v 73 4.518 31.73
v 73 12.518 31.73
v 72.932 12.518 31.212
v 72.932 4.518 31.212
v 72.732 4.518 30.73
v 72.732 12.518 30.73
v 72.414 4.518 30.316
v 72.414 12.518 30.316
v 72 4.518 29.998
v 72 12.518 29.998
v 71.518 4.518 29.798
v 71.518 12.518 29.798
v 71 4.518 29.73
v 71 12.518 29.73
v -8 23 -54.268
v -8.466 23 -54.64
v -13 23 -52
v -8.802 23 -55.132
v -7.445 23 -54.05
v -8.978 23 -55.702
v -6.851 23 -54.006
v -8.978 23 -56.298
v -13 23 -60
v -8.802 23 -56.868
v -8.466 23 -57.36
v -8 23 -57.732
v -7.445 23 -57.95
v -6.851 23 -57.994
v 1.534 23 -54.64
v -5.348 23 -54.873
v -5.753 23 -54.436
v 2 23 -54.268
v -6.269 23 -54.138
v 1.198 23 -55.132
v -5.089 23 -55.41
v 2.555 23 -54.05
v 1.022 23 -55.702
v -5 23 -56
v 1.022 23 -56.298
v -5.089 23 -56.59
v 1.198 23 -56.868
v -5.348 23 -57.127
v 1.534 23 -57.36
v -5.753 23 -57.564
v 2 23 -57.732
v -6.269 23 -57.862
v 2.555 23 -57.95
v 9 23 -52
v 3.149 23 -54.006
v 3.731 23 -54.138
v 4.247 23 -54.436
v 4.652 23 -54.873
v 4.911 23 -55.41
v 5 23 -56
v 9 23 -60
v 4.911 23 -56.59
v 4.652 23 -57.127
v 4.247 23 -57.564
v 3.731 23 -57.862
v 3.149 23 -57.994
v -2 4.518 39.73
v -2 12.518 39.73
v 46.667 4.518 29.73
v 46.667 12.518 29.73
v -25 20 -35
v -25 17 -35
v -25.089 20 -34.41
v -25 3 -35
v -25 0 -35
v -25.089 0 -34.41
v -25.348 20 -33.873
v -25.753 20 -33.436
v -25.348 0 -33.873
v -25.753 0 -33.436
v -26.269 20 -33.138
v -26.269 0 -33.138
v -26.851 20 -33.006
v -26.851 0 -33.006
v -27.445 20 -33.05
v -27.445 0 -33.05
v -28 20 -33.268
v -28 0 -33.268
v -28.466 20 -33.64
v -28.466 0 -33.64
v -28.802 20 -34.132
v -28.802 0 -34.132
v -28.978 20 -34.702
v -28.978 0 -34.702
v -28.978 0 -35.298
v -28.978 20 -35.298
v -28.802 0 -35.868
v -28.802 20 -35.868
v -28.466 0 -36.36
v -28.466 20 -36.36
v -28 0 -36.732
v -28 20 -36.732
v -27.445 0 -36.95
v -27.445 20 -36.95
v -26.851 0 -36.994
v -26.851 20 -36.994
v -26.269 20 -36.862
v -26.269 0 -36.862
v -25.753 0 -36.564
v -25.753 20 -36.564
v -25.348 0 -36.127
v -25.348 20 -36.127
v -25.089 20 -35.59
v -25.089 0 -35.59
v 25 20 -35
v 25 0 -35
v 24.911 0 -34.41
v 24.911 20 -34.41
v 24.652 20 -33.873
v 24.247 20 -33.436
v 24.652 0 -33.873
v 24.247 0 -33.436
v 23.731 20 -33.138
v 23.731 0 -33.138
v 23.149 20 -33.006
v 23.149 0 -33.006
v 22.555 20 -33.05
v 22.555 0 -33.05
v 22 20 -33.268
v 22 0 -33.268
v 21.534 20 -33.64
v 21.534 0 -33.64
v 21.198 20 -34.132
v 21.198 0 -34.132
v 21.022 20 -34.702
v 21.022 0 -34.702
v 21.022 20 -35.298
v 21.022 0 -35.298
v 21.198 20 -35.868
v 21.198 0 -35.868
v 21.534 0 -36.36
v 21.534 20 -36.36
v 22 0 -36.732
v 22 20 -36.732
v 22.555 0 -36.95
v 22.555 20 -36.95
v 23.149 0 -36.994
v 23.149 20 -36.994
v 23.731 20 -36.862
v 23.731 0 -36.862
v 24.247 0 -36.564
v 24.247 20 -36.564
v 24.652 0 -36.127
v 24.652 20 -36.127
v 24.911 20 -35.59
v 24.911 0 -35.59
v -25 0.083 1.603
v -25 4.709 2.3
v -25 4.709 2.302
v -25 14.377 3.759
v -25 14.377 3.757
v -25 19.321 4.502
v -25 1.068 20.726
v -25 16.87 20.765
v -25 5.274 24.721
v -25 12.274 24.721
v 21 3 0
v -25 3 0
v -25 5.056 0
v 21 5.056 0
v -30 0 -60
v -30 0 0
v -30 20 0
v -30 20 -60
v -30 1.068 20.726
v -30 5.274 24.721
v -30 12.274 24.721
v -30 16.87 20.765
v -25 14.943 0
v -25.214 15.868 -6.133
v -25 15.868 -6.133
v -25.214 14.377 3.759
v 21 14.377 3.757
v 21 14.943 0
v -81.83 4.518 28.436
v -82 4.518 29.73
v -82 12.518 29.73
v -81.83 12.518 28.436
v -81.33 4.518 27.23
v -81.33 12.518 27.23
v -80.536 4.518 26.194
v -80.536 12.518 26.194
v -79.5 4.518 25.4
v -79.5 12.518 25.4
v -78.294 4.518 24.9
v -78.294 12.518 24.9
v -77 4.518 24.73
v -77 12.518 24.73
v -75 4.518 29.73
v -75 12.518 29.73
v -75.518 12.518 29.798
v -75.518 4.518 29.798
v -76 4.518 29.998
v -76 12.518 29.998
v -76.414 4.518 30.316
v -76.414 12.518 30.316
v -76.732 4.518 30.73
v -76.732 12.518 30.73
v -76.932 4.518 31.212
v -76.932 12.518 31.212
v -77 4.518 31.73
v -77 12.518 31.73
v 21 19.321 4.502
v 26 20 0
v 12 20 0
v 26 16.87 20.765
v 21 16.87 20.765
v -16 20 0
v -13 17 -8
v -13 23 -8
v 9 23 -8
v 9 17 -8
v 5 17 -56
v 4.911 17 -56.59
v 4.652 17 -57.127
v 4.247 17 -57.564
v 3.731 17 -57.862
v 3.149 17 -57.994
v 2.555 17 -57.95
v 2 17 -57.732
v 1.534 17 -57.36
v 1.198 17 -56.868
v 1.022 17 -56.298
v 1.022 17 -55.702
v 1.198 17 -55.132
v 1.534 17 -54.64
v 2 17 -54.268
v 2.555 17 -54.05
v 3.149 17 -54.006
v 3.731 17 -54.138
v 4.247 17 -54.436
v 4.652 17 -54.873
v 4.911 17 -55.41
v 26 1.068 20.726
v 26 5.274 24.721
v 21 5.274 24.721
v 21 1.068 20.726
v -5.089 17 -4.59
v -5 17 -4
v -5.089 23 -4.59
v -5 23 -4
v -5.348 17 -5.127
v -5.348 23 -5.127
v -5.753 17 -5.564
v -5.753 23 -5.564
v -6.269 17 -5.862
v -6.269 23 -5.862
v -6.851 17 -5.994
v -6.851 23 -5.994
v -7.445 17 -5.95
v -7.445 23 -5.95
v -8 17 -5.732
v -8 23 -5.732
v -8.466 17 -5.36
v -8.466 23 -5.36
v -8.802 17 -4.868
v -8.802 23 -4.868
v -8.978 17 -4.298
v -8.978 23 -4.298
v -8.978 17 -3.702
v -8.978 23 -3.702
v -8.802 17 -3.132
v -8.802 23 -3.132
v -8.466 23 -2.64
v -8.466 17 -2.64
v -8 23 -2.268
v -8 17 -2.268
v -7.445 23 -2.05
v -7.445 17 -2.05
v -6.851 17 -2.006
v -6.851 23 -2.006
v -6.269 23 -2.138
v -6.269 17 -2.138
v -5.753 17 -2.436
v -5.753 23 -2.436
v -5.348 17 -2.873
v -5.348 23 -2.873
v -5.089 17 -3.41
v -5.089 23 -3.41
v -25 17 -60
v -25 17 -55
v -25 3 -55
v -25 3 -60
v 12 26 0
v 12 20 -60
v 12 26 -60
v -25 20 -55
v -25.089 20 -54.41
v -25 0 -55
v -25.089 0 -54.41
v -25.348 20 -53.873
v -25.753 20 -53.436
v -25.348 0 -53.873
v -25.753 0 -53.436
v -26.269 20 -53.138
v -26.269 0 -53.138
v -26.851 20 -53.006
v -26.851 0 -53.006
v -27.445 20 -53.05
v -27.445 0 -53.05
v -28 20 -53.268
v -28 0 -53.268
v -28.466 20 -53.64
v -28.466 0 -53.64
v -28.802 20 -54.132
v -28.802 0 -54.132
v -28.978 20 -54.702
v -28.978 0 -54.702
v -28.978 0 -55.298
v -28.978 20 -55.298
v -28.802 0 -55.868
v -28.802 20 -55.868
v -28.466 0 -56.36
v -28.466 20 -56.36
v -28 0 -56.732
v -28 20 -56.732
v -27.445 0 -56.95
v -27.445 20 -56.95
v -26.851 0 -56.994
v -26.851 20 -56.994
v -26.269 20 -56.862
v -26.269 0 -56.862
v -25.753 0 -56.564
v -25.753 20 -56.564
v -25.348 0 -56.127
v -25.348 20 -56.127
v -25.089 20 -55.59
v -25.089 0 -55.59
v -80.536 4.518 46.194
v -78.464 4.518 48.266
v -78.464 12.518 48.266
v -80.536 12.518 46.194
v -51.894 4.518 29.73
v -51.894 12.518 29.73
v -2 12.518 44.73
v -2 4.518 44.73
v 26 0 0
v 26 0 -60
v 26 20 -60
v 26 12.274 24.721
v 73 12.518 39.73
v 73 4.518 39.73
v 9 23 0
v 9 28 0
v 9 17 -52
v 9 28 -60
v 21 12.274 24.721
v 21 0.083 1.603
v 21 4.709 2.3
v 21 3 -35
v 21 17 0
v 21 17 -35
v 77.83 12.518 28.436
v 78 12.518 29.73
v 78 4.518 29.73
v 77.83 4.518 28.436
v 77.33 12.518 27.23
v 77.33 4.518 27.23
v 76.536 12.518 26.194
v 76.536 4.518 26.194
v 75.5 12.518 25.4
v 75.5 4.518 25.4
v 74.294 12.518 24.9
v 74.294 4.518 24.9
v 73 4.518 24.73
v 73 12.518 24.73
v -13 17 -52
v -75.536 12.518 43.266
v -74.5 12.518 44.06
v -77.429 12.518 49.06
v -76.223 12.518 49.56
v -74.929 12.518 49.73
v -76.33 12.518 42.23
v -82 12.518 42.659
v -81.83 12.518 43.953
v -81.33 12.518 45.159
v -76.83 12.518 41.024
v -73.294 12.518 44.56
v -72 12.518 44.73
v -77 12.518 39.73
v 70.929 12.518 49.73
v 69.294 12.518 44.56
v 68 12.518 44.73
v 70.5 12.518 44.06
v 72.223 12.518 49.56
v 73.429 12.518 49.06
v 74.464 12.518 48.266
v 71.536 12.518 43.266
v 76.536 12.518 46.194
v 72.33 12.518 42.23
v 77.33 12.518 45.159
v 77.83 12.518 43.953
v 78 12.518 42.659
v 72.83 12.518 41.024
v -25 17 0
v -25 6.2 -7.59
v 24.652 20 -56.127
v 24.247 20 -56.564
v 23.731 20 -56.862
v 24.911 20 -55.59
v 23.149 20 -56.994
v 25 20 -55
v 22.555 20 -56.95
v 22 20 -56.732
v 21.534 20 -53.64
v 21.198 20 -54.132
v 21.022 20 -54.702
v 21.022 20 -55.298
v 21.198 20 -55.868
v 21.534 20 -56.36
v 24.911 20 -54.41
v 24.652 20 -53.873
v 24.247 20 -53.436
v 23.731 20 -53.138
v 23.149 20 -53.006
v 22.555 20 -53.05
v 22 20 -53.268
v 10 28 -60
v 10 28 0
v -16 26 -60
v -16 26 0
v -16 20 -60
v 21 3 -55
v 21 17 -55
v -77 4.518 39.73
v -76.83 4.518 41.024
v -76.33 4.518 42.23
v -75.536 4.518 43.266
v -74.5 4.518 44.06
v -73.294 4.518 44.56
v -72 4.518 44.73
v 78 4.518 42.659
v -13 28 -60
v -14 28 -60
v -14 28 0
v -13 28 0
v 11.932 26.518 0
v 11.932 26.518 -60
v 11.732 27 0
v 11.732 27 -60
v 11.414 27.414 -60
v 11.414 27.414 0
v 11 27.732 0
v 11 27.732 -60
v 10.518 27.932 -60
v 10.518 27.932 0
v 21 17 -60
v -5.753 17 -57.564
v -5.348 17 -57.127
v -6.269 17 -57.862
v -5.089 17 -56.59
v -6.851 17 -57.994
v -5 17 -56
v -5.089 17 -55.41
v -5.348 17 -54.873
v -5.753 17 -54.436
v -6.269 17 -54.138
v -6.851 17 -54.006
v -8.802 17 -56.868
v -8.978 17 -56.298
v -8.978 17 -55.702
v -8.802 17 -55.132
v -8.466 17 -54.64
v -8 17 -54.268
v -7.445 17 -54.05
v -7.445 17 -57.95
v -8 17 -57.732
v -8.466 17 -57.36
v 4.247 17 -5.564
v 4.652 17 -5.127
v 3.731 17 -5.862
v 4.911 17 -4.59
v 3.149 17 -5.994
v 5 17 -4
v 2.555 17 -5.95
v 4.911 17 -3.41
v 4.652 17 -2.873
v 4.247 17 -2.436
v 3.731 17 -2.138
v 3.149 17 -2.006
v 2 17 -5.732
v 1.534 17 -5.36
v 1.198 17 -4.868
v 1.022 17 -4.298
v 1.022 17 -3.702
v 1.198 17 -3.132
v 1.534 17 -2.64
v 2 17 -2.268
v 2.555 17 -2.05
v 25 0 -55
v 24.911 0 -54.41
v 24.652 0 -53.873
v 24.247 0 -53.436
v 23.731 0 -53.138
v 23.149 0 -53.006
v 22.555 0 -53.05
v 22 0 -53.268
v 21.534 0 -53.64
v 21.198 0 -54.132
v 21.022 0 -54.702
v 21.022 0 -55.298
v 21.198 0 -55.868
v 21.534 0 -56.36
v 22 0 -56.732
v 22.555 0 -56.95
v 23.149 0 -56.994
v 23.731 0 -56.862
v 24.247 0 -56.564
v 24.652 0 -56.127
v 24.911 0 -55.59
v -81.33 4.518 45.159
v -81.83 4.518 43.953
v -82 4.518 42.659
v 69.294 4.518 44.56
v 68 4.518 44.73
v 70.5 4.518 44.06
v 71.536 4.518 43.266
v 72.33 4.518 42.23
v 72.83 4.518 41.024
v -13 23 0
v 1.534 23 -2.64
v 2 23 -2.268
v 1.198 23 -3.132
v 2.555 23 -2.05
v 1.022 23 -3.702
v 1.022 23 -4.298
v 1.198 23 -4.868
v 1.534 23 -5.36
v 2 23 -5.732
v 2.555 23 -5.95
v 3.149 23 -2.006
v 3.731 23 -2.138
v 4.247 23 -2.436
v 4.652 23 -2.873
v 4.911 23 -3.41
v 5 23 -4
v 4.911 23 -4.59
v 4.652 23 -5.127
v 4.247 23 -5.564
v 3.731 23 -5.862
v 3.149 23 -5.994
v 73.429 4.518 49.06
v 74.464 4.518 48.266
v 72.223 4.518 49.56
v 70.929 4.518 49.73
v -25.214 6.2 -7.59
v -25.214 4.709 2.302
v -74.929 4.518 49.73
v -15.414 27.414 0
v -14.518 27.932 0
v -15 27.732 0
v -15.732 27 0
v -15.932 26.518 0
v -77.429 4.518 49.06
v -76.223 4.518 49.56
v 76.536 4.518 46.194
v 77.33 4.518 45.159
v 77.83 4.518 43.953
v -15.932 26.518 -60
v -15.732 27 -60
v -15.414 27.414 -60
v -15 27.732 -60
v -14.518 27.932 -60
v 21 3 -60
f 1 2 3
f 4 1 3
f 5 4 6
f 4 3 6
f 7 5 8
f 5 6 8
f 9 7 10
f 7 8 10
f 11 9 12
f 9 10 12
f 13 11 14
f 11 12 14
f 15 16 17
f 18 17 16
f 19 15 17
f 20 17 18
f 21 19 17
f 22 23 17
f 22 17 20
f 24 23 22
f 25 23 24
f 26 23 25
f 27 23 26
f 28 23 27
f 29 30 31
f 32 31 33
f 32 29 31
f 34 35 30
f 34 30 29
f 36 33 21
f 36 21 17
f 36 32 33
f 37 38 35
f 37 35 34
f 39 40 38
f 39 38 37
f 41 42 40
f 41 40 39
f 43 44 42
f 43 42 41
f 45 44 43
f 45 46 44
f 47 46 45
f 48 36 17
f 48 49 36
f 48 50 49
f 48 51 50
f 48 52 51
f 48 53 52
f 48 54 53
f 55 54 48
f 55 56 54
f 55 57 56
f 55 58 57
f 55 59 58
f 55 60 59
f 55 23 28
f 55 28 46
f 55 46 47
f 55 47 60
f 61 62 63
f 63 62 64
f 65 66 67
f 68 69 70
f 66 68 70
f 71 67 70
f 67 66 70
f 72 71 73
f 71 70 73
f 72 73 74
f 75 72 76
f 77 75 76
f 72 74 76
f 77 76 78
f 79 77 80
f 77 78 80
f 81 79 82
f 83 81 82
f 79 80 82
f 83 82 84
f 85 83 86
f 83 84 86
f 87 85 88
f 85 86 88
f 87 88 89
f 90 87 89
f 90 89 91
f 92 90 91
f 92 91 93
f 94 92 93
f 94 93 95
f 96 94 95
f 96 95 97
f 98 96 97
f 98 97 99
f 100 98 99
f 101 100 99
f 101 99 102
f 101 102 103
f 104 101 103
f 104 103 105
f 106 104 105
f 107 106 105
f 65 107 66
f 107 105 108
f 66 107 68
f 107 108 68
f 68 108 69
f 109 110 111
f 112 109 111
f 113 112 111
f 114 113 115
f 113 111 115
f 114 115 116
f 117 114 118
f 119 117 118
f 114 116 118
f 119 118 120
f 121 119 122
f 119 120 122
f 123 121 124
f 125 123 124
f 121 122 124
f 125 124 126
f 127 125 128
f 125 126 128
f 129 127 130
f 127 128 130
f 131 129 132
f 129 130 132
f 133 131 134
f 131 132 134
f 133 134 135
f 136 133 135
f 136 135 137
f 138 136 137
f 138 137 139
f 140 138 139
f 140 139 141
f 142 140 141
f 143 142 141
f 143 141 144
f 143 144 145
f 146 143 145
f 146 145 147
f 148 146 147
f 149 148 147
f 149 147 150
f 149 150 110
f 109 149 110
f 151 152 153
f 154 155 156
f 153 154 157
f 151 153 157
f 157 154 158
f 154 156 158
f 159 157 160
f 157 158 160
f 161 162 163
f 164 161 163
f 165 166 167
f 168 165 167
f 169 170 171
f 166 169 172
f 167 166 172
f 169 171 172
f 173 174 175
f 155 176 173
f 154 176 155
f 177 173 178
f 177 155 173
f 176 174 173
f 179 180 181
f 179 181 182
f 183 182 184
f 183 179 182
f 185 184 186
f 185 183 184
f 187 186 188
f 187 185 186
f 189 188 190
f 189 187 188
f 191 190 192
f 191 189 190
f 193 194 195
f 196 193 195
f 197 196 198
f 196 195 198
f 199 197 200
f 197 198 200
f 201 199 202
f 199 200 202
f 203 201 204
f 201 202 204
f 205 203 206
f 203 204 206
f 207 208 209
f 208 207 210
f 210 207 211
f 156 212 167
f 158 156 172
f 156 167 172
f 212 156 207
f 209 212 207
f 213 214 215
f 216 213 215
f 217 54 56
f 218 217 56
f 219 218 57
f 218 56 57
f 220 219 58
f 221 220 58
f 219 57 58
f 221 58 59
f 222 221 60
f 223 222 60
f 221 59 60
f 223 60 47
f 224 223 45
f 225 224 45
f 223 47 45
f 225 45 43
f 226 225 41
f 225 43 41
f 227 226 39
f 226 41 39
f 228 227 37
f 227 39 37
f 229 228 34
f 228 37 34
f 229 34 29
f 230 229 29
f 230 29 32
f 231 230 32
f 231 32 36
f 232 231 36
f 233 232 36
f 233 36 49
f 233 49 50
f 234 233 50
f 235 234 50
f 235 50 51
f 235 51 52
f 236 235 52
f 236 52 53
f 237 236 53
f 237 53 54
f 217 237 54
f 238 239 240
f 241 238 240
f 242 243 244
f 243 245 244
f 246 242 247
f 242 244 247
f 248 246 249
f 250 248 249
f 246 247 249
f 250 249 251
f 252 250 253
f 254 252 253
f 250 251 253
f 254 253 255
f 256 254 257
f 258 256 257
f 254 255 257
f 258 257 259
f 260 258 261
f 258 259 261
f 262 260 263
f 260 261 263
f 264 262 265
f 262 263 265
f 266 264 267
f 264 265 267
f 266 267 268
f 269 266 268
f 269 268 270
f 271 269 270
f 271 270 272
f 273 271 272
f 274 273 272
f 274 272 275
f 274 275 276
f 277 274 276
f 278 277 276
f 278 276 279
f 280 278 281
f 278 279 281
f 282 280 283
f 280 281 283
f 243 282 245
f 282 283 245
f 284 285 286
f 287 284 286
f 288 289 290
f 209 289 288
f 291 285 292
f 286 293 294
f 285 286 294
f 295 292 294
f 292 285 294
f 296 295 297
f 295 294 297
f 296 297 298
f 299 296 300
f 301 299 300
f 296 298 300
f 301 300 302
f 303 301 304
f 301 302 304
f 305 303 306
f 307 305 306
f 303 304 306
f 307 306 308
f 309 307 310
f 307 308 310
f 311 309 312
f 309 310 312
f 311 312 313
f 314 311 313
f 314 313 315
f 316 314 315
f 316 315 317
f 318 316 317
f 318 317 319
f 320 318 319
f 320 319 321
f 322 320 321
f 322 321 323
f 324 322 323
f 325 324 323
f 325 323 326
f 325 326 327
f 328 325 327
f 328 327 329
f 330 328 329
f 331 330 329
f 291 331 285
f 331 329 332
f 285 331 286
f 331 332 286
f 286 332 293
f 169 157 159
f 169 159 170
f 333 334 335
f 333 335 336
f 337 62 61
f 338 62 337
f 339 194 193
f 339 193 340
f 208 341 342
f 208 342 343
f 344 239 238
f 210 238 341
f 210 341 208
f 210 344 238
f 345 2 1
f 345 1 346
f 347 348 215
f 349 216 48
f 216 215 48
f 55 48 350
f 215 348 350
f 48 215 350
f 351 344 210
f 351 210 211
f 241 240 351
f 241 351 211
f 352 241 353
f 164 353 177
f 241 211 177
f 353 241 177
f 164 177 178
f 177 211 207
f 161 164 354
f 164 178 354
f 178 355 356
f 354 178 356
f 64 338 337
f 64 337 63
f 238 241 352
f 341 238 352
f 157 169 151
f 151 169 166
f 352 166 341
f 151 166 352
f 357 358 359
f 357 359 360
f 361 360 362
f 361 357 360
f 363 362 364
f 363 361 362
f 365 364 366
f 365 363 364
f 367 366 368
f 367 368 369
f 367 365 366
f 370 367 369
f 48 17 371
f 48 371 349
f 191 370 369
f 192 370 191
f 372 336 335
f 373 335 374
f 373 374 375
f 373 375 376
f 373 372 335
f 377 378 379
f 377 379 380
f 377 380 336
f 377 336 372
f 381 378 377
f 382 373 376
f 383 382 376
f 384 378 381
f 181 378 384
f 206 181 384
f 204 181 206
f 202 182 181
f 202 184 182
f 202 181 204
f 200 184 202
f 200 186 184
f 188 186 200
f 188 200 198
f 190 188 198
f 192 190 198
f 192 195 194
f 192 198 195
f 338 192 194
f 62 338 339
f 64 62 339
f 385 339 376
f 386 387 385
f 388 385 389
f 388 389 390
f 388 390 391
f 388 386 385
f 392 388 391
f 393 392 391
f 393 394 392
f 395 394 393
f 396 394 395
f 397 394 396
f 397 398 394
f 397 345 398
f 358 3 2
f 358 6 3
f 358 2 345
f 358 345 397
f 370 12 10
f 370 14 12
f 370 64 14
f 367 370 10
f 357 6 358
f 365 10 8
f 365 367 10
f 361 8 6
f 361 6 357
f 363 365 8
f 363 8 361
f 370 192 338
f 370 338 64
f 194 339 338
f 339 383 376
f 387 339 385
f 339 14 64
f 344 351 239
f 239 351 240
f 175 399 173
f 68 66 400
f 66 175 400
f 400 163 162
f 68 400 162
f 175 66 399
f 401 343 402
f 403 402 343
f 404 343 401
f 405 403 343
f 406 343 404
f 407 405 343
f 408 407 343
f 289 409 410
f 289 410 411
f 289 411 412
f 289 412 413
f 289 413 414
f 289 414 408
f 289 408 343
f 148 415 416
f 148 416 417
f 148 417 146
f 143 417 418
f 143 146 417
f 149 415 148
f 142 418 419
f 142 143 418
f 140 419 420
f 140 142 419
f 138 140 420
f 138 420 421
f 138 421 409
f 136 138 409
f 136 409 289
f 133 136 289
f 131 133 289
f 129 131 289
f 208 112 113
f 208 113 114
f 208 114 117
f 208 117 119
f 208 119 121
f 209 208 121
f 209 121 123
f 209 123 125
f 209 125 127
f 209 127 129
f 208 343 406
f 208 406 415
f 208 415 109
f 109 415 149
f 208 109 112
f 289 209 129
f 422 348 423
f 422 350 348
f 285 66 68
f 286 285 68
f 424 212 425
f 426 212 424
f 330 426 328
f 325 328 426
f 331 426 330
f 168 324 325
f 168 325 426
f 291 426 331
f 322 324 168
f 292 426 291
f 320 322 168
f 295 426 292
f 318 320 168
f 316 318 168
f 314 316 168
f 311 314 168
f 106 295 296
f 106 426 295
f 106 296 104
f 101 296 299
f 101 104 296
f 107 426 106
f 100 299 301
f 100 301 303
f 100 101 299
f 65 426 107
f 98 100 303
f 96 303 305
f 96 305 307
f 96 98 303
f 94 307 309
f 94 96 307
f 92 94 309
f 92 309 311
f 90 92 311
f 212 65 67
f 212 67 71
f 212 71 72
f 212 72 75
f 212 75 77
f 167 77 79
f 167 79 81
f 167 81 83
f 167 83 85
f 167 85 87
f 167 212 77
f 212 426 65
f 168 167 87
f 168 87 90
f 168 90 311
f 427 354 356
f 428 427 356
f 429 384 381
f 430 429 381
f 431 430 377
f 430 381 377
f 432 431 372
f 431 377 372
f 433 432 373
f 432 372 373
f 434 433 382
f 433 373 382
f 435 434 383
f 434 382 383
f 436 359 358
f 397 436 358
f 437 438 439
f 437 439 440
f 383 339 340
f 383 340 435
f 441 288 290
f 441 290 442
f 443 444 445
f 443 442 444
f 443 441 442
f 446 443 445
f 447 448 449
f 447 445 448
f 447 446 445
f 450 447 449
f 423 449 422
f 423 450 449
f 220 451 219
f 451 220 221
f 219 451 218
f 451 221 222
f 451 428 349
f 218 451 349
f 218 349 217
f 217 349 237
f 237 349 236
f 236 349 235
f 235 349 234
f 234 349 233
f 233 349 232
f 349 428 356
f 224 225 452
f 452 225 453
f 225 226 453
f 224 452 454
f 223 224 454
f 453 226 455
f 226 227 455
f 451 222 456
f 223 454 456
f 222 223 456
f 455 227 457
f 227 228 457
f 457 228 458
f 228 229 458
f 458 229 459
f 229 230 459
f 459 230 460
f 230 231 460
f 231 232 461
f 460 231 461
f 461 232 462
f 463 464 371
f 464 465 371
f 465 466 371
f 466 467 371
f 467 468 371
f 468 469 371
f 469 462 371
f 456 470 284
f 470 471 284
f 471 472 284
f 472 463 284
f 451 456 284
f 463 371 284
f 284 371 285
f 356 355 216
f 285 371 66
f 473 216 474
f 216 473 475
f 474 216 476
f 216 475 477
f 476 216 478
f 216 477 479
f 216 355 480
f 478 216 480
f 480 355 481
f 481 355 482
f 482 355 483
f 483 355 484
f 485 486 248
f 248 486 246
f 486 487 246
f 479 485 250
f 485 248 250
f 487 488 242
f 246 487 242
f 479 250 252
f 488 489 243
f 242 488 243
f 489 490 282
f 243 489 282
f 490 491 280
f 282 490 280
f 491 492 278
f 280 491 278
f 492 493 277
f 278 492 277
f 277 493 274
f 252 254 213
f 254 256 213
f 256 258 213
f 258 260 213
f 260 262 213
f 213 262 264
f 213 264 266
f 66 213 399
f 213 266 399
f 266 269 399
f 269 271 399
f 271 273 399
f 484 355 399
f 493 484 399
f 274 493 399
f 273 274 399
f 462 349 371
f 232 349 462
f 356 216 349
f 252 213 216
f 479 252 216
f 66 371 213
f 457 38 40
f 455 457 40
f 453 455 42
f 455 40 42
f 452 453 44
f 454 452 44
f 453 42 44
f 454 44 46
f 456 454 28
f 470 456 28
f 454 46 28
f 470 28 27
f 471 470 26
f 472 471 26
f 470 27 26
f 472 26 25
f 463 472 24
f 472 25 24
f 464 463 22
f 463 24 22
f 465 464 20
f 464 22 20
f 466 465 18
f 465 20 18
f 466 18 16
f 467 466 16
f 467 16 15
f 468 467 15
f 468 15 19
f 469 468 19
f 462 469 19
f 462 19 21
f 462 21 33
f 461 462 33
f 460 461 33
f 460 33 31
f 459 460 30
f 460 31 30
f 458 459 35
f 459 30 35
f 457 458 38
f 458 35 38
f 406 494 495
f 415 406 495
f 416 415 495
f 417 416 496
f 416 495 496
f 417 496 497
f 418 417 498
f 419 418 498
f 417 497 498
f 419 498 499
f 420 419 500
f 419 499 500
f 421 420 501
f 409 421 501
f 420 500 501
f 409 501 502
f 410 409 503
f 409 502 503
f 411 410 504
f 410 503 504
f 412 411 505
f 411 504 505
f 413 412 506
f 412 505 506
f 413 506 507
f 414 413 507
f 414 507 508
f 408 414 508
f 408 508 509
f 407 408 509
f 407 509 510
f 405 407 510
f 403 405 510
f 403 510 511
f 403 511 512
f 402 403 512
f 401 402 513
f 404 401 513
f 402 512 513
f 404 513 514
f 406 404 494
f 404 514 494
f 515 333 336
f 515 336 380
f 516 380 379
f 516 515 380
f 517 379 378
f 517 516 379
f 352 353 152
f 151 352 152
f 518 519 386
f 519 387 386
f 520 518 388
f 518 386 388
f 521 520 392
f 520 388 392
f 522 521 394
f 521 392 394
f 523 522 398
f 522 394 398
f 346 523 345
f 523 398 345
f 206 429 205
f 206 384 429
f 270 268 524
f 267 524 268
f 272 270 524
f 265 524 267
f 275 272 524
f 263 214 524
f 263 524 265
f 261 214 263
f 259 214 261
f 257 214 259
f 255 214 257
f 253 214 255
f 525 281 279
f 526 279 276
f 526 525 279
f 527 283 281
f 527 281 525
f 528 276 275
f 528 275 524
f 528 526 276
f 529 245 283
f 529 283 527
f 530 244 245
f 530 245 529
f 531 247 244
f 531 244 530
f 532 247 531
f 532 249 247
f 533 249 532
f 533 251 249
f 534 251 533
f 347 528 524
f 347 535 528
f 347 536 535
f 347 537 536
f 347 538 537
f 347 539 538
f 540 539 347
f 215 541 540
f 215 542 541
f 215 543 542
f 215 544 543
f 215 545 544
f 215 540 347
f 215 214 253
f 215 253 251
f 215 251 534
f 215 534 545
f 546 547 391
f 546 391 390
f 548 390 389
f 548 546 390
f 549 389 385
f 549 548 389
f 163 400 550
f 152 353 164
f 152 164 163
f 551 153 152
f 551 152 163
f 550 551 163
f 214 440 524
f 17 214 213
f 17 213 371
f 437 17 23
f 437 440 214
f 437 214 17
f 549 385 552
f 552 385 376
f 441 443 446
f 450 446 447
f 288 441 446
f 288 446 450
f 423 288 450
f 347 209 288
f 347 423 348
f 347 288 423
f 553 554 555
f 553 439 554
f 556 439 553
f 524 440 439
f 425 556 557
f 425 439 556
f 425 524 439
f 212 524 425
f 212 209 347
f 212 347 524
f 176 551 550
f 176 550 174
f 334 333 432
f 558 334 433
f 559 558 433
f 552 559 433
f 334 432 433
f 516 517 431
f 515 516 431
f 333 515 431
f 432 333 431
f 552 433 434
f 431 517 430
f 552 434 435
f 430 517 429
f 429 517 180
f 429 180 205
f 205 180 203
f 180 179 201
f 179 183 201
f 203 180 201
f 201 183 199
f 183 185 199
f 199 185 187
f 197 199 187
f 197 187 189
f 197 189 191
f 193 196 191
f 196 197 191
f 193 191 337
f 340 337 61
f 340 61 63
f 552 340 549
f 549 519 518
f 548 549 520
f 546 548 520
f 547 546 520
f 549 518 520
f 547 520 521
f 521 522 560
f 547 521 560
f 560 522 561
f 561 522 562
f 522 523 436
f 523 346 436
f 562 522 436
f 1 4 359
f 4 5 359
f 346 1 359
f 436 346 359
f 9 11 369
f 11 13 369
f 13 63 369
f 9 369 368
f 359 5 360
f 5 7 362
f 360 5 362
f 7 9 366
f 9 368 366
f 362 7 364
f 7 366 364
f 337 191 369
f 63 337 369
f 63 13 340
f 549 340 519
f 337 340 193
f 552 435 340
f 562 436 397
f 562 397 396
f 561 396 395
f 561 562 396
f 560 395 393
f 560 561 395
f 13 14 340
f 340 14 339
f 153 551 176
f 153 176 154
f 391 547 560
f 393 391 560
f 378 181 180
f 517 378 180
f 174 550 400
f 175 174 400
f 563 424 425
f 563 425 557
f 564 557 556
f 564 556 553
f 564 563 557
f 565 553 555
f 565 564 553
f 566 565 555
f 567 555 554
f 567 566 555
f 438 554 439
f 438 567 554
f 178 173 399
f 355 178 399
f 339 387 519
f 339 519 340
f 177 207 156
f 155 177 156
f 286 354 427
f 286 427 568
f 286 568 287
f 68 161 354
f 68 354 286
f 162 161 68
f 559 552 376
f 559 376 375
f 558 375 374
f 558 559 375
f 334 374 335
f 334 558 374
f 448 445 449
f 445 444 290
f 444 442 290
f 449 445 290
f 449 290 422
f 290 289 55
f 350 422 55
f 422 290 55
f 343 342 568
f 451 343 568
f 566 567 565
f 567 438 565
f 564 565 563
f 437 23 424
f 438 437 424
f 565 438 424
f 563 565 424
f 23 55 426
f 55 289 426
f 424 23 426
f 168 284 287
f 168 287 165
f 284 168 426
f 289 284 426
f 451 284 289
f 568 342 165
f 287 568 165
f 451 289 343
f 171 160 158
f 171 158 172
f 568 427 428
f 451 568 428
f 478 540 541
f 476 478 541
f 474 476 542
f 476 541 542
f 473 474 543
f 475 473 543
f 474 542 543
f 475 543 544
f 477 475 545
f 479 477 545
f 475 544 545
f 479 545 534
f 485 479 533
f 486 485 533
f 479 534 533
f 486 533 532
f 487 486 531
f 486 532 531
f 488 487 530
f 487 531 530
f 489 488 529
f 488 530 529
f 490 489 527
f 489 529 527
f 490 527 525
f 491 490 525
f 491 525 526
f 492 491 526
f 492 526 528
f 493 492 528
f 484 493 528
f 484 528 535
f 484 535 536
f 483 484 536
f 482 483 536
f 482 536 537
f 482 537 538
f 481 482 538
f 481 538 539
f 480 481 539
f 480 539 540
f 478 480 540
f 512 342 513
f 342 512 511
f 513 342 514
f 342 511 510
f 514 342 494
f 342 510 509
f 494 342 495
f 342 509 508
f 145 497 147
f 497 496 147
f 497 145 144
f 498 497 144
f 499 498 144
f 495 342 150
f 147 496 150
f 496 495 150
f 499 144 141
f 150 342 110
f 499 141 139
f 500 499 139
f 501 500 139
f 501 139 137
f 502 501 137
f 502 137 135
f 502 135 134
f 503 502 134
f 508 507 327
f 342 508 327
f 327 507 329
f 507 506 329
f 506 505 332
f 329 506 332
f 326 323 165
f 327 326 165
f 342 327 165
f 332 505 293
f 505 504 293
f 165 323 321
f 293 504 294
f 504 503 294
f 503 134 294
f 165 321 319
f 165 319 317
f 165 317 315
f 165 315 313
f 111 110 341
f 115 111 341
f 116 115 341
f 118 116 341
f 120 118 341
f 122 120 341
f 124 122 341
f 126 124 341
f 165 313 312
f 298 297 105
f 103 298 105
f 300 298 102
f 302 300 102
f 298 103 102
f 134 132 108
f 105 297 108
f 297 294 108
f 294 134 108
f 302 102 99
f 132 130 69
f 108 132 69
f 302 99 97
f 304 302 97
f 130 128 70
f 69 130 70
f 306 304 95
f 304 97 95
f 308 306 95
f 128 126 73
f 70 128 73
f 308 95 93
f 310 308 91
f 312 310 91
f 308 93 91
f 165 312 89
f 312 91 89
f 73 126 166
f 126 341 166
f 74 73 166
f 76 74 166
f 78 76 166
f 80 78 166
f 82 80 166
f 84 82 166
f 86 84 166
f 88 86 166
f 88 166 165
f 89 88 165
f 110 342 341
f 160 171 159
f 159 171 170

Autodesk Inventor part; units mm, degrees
sketch "Boceto1" plane through (0, 0, 0) normal (0, 1, 0) x (-1, 0, 0)
  line L0 (0, 0) -> (0, -60)
  line L1 (0, 0) -> (30, 0)
  line L2 (0, -60) -> (30, -60)
  line L3 (30, -60) -> (30, 0)
  line L4 (0, 0) -> (-26, 0)
  line L5 (-26, 0) -> (-26, -60)
  line L6 (-26, -60) -> (0, -60)
  dimension "d0" = 60
  dimension "d1" = 30
  dimension "d2" = 30
  dimension "d3" = 26
extrude "Extrusión1" add sketch "Boceto1" along normal blind 20
sketch "Boceto2" plane through (-30, 0, 0) normal (0, 0, 1) x (1, 0, 0)
  line L0 (56, 0) -> (0, 0) construction
  line L1 (28, 0) -> (28, 20) construction
  line L2 (56, 20) -> (0, 20) construction
  line L3 (0, 0) -> (0, 20) construction
  line L4 (0, 10) -> (5, 10) construction
  line L5 (56, 0) -> (56, 20) construction
  line L6 (56, 10) -> (51, 10) construction
  line L7 (28, 20) -> (28, 17) construction
  line L8 (28, 17) -> (51, 17)
  line L9 (51, 17) -> (51, 10)
  line L10 (28, 17) -> (5, 17)
  line L11 (5, 17) -> (5, 10)
  line L12 (28, 0) -> (28, 3) construction
  line L13 (28, 3) -> (5, 3)
  line L14 (5, 3) -> (5, 10)
  line L15 (28, 3) -> (51, 3)
  line L16 (51, 3) -> (51, 10)
  point P0 (30, 0)
  dimension "d8" = 3
  dimension "d9" = 3
extrude "Extrusión2" cut sketch "Boceto2" against normal through all
sketch "Boceto3" plane through (0, 20, 0) normal (0, 1, 0) x (1, 0, 0)
  line L0 (21, 60) -> (-25, 60) projected
  line L1 (-2, 60) -> (-2, 0)
  line L2 (-25, 0) -> (21, 0) projected
  line L3 (-2, 0) -> (12, 0) construction
  line L4 (-2, 0) -> (-16, 0) construction
  line L5 (-16, 0) -> (-16, 60) construction
  line L6 (-16, 60) -> (12, 60)
  line L7 (12, 60) -> (12, 0)
  line L8 (12, 0) -> (-16, 0)
  line L9 (-16, 0) -> (-16, 60)
  point P0 (0, 0)
  point P1 (12, 60)
  dimension "d12" = 14
  dimension "d13" = 14
extrude "Extrusión3" add sketch "Boceto3" along normal blind 8
sketch "Boceto4" plane through (0, 28, 0) normal (0, 1, 0) x (1, 0, 0)
  line L0 (12, 0) -> (26, 0) construction
  line L1 (12, 0) -> (9, 0) construction
  line L2 (9, 0) -> (9, 60)
  line L3 (26, 60) -> (-30, 60) projected
  line L4 (-16, 0) -> (-16, 60) projected
  line L5 (-16, 0) -> (-13, 0)
  line L6 (-30, 0) -> (26, 0) projected
  line L7 (-13, 0) -> (-13, 60)
  line L8 (-2, 0) -> (-2, 8) construction
  line L9 (-13, 8) -> (9, 8)
  line L10 (-2, 60) -> (-2, 52) construction
  line L11 (-13, 52) -> (9, 52)
  line L12 (9, 56) -> (5, 56) construction
  line L13 (-13, 30) -> (9, 30) construction
  line L14 (5, 56) -> (3, 56) construction
  circle A0 centre (3, 56) radius 2
  circle A1 centre (-7, 56) radius 2
  circle A2 centre (3, 4) radius 2
  circle A3 centre (-7, 4) radius 2
  point P0 (0, 0)
  dimension "d16" = 3
  dimension "d17" = 3
  dimension "d18" = 8
  dimension "d19" = 8
  dimension "d20" = 4
  dimension "d21" = 2
extrude "Extrusión4" cut sketch "Boceto4" against normal blind 15 contours L9 L7 L11 L2
extrude "Extrusión5" cut sketch "Boceto4" against normal blind 15 contours A0 | A1 | A2 | A3
extrude "Extrusión6" cut sketch "Boceto4" against normal blind 5 contours L6 L7 L9 L2 | L11 L7 L3 L2
fillet "Empalme1" radius 2 2 edges at (-16, 28, -30) (12, 28, -30)
ref_plane "Plano de trabajo1" through (-2, 0, 0) normal (1, 0, 0) x (0, 1, 0)
sketch "Boceto6" plane through (-2, 0, 0) normal (1, 0, 0) x (0, 1, 0)
  line L0 (0, 0) -> (20, 0) projected
  line L1 (28, 0) -> (23, 0) projected
  line L2 (28, 0) -> (0, 0)
  line L3 (20, 0) -> (16.2743, 24.7208)
  line L4 (16.2743, 24.7208) -> (1.2743, 24.7208)
  line L5 (1.2743, 24.7208) -> (0, 0)
  line L6 (0, 0) -> (20, 0)
  dimension "d32" = 25
  dimension "d33" = 15
extrude "Extrusión7" add sketch "Boceto6" along normal mid plane 56
sketch "Boceto7" plane through (-30, 16.2743, 24.7208) normal (0, 0.9888, 0.149) x (1, 0, 0)
  line L0 (56, -2.2354) -> (56, 22.0194) construction
  line L1 (56, 9.892) -> (51, 9.892) construction
  line L2 (0, 22.0194) -> (0, -2.2354) construction
  line L3 (0, 11.3809) -> (5, 11.3809) construction
  line L4 (39, 25.4471) -> (17, 25.4471) construction
  line L5 (28, 25.4471) -> (28, 20.4471) construction
  line L6 (0, 0) -> (56, 0) projected
  line L7 (5, 0) -> (51, 0)
  line L8 (51, 0) -> (51, 20.4471)
  line L9 (51, 20.4471) -> (5, 20.4471)
  line L10 (5, 20.4471) -> (5, 0)
  line L11 (5, 0) -> (5, -22.0119)
  line L12 (5, -22.0119) -> (51, -22.0119)
  line L13 (51, -22.0119) -> (51, 0)
  point P0 (30, 22.0194)
  dimension "d36" = 5
  dimension "d38" = 5
  dimension "d39" = 5
extrude "Extrusión8" cut sketch "Boceto7" against normal blind 56
ref_plane "Plano de trabajo2" through (26, 0, 24.73) normal (0, 0, -1) x (-1, 0, 0)
sketch "Boceto8" plane through (26, 0, 24.73) normal (0, 0, -1) x (-1, 0, 0)
  line L0 (17, 23) -> (39, 23) construction
  line L1 (28, 23) -> (28, 0) construction
  line L2 (56, 0) -> (0, 0) construction
  line L3 (28, 8.5182) -> (108, 8.5182) construction
  line L4 (28, 8.5182) -> (-52, 8.5182) construction
  line L5 (28, 8.5182) -> (28, 12.5182) construction
  line L6 (28, 8.5182) -> (28, 4.5182) construction
  line L7 (-52, 12.5182) -> (108, 12.5182)
  line L8 (108, 12.5182) -> (108, 4.5182)
  line L9 (108, 4.5182) -> (-52, 4.5182)
  line L10 (-52, 4.5182) -> (-52, 12.5182)
  point P0 (26, 0)
  dimension "d43" = 80
  dimension "d44" = 80
  dimension "d45" = 4
  dimension "d46" = 4
extrude "Extrusión9" add sketch "Boceto8" against normal blind 25
fillet "Empalme2" radius 5 2 edges at (78, 8.5182, 24.73) (-82, 8.5182, 24.73)
sketch "Boceto9" plane through (-82, 12.5182, 49.73) normal (0, 1, 0) x (1, 0, 0)
  line L0 (0, 0) -> (160, 0) construction
  line L1 (0, 0) -> (0, 5) construction
  line L2 (0, 20) -> (0, 0) construction
  line L3 (0, 5) -> (5, 5) construction
  line L4 (5, 5) -> (5, 0) construction
  line L5 (160, 20) -> (160, 0) construction
  line L6 (160, 0) -> (160, 5) construction
  line L7 (160, 5) -> (155, 5) construction
  line L8 (155, 5) -> (155, 0) construction
  line L9 (5, 0) -> (0, 5)
  line L10 (155, 0) -> (160, 5)
  line L11 (5, 0) -> (0, 0)
  line L12 (0, 0) -> (0, 5)
  line L13 (155, 0) -> (160, 0)
  line L14 (160, 0) -> (160, 5)
  point P0 (82, 49.73)
  dimension "d50" = 5
  dimension "d51" = 5
  dimension "d52" = 5
  dimension "d53" = 5
extrude "Extrusión10" cut sketch "Boceto9" against normal through all
fillet "Empalme3" radius 5 4 edges at (-82, 8.5182, 44.73) (78, 8.5182, 44.73) (73, 8.5182, 49.73) (-77, 8.5182, 49.73)
sketch "Boceto10" plane through (-77, 12.5182, 24.73) normal (0, 1, 0) x (1, 0, 0)
  line L0 (150, 0) -> (0, 0) construction
  line L1 (75, 0) -> (75, -5) construction
  line L2 (2.0711, -25) -> (147.9289, -25) construction
  line L3 (75, -25) -> (75, -20) construction
  line L4 (-5, -5) -> (-5, -17.9289) construction
  line L5 (-5, -11.4645) -> (0, -11.4645) construction
  line L6 (155, -5) -> (155, -17.9289) construction
  line L7 (155, -11.4645) -> (150, -11.4645) construction
  line L8 (2, -5) -> (148, -5)
  line L9 (150, -7) -> (150, -15)
  line L10 (145, -20) -> (5, -20)
  line L11 (0, -15) -> (0, -7)
  arc A0 (2, -5) -> (0, -7) centre (2, -7) ccw
  arc A1 (150, -7) -> (148, -5) centre (148, -7) ccw
  arc A2 (0, -15) -> (5, -20) centre (5, -15) ccw
  arc A3 (145, -20) -> (150, -15) centre (145, -15) ccw
  point P0 (77, 24.73)
  dimension "d57" = 5
  dimension "d58" = 5
  dimension "d59" = 5
  dimension "d60" = 2
  dimension "d61" = 2
  dimension "d62" = 5
extrude "Extrusión11" cut sketch "Boceto10" against normal through all
ref_plane "Plano de trabajo3" through (-77, 12.5182, 24.73) normal (0, 1, 0) x (1, 0, 0)
sketch "Boceto11" plane through (-77, 12.5182, 24.73) normal (0, 1, 0) x (1, 0, 0)
  line L0 (2, -5) -> (148, -5) projected
  line L1 (2, -5) -> (75, -20)
  line L2 (145, -20) -> (5, -20) projected
  line L3 (148, -5) -> (75, -20)
  line L4 (75, -20) -> (75, -15) construction
  line L5 (75, -20) -> (80, -20) construction
  line L6 (75, -15) -> (123.6667, -5)
  line L7 (75, -15) -> (25.1063, -5)
  line L8 (2, -5) -> (25.1063, -5)
  line L9 (123.6667, -5) -> (148, -5)
  point P0 (77, 24.73)
  dimension "d67" = 5
  dimension "d68" = 90
extrude "Extrusión12" add sketch "Boceto11" against normal blind 8 contours L0 L7 L6 L3 L1
chamfer "Chaflán1" distance 4 angle 45 4 edges at (23.5, 1.2743, 24.7208) (-27.5, 1.2743, 24.7208) (23.5, 16.2743, 24.7208) (-27.5, 16.2743, 24.7208)
sketch "Boceto12" plane through (0, 0, 0) normal (0, -1, 0) x (1, 0, 0)
  line L0 (26, -60) -> (-30, -60) construction
  line L1 (-25, 0) -> (-25, -60) construction
  line L2 (-30, -60) -> (-25, -60) construction
  line L3 (-27.5, -60) -> (-27.5, -55) construction
  line L4 (-30, -60) -> (-30, 0) construction
  line L5 (-30, -55) -> (-25, -55) construction
  line L6 (-25, -55) -> (-27, -55) construction
  circle A0 centre (-27, -55) radius 2
  line L7 (-2, -60) -> (-2, 0) construction
  circle A1 centre (23, -55) radius 2
  line L8 (26, -60) -> (26, -30) construction
  line L9 (26, 0) -> (26, -60) construction
  line L10 (26, -30) -> (-30, -30) construction
  line L11 (-30, -30.4996) -> (-30, -45.4996) construction
  line L12 (-30, -45.4996) -> (26, -45.4996) construction
  line L13 (-27, -55) -> (-27, -35) construction
  circle A2 centre (-27, -35) radius 2
  line L14 (23, -55) -> (23, -35) construction
  circle A3 centre (23, -35) radius 2
  point P0 (0, 0)
  dimension "d74" = 5
  dimension "d79" = 2
  dimension "d80" = 4
  dimension "d81" = 30
  dimension "d82" = 15
  dimension "d83" = 20
  dimension "d84" = 4
  dimension "d85" = 20
  dimension "d86" = 4
extrude "Extrusión13" cut sketch "Boceto12" against normal through all
sketch "Boceto13" plane through (-25, 19.3215, 4.5021) normal (0, -0.149, 0.9888) x (1, 0, 0)
  line L0 (9, 0) -> (37, 0) construction
  line L1 (23, 0) -> (23, -5) construction
  line L2 (-5, -5) -> (51, -5)
  line L3 (51, -5) -> (51, -14.777)
  line L4 (51, -14.777) -> (-5, -14.777)
  line L5 (-5, -14.777) -> (-5, -5)
  line L6 (46, -25.7518) -> (46, -11.9082) projected
  line L7 (46, -14.777) -> (46, -5)
  line L8 (46, -2.9665) -> (46, -16.8102) projected
  line L9 (-0.2144, -14.777) -> (-0.2144, -5)
  point P0 (25, -19.7767)
  dimension "d87" = 5
  dimension "d88" = 9.777
extrude "Extrusión14" cut sketch "Boceto13" against normal blind 10 contours L2 L7 L6 L4 L9
